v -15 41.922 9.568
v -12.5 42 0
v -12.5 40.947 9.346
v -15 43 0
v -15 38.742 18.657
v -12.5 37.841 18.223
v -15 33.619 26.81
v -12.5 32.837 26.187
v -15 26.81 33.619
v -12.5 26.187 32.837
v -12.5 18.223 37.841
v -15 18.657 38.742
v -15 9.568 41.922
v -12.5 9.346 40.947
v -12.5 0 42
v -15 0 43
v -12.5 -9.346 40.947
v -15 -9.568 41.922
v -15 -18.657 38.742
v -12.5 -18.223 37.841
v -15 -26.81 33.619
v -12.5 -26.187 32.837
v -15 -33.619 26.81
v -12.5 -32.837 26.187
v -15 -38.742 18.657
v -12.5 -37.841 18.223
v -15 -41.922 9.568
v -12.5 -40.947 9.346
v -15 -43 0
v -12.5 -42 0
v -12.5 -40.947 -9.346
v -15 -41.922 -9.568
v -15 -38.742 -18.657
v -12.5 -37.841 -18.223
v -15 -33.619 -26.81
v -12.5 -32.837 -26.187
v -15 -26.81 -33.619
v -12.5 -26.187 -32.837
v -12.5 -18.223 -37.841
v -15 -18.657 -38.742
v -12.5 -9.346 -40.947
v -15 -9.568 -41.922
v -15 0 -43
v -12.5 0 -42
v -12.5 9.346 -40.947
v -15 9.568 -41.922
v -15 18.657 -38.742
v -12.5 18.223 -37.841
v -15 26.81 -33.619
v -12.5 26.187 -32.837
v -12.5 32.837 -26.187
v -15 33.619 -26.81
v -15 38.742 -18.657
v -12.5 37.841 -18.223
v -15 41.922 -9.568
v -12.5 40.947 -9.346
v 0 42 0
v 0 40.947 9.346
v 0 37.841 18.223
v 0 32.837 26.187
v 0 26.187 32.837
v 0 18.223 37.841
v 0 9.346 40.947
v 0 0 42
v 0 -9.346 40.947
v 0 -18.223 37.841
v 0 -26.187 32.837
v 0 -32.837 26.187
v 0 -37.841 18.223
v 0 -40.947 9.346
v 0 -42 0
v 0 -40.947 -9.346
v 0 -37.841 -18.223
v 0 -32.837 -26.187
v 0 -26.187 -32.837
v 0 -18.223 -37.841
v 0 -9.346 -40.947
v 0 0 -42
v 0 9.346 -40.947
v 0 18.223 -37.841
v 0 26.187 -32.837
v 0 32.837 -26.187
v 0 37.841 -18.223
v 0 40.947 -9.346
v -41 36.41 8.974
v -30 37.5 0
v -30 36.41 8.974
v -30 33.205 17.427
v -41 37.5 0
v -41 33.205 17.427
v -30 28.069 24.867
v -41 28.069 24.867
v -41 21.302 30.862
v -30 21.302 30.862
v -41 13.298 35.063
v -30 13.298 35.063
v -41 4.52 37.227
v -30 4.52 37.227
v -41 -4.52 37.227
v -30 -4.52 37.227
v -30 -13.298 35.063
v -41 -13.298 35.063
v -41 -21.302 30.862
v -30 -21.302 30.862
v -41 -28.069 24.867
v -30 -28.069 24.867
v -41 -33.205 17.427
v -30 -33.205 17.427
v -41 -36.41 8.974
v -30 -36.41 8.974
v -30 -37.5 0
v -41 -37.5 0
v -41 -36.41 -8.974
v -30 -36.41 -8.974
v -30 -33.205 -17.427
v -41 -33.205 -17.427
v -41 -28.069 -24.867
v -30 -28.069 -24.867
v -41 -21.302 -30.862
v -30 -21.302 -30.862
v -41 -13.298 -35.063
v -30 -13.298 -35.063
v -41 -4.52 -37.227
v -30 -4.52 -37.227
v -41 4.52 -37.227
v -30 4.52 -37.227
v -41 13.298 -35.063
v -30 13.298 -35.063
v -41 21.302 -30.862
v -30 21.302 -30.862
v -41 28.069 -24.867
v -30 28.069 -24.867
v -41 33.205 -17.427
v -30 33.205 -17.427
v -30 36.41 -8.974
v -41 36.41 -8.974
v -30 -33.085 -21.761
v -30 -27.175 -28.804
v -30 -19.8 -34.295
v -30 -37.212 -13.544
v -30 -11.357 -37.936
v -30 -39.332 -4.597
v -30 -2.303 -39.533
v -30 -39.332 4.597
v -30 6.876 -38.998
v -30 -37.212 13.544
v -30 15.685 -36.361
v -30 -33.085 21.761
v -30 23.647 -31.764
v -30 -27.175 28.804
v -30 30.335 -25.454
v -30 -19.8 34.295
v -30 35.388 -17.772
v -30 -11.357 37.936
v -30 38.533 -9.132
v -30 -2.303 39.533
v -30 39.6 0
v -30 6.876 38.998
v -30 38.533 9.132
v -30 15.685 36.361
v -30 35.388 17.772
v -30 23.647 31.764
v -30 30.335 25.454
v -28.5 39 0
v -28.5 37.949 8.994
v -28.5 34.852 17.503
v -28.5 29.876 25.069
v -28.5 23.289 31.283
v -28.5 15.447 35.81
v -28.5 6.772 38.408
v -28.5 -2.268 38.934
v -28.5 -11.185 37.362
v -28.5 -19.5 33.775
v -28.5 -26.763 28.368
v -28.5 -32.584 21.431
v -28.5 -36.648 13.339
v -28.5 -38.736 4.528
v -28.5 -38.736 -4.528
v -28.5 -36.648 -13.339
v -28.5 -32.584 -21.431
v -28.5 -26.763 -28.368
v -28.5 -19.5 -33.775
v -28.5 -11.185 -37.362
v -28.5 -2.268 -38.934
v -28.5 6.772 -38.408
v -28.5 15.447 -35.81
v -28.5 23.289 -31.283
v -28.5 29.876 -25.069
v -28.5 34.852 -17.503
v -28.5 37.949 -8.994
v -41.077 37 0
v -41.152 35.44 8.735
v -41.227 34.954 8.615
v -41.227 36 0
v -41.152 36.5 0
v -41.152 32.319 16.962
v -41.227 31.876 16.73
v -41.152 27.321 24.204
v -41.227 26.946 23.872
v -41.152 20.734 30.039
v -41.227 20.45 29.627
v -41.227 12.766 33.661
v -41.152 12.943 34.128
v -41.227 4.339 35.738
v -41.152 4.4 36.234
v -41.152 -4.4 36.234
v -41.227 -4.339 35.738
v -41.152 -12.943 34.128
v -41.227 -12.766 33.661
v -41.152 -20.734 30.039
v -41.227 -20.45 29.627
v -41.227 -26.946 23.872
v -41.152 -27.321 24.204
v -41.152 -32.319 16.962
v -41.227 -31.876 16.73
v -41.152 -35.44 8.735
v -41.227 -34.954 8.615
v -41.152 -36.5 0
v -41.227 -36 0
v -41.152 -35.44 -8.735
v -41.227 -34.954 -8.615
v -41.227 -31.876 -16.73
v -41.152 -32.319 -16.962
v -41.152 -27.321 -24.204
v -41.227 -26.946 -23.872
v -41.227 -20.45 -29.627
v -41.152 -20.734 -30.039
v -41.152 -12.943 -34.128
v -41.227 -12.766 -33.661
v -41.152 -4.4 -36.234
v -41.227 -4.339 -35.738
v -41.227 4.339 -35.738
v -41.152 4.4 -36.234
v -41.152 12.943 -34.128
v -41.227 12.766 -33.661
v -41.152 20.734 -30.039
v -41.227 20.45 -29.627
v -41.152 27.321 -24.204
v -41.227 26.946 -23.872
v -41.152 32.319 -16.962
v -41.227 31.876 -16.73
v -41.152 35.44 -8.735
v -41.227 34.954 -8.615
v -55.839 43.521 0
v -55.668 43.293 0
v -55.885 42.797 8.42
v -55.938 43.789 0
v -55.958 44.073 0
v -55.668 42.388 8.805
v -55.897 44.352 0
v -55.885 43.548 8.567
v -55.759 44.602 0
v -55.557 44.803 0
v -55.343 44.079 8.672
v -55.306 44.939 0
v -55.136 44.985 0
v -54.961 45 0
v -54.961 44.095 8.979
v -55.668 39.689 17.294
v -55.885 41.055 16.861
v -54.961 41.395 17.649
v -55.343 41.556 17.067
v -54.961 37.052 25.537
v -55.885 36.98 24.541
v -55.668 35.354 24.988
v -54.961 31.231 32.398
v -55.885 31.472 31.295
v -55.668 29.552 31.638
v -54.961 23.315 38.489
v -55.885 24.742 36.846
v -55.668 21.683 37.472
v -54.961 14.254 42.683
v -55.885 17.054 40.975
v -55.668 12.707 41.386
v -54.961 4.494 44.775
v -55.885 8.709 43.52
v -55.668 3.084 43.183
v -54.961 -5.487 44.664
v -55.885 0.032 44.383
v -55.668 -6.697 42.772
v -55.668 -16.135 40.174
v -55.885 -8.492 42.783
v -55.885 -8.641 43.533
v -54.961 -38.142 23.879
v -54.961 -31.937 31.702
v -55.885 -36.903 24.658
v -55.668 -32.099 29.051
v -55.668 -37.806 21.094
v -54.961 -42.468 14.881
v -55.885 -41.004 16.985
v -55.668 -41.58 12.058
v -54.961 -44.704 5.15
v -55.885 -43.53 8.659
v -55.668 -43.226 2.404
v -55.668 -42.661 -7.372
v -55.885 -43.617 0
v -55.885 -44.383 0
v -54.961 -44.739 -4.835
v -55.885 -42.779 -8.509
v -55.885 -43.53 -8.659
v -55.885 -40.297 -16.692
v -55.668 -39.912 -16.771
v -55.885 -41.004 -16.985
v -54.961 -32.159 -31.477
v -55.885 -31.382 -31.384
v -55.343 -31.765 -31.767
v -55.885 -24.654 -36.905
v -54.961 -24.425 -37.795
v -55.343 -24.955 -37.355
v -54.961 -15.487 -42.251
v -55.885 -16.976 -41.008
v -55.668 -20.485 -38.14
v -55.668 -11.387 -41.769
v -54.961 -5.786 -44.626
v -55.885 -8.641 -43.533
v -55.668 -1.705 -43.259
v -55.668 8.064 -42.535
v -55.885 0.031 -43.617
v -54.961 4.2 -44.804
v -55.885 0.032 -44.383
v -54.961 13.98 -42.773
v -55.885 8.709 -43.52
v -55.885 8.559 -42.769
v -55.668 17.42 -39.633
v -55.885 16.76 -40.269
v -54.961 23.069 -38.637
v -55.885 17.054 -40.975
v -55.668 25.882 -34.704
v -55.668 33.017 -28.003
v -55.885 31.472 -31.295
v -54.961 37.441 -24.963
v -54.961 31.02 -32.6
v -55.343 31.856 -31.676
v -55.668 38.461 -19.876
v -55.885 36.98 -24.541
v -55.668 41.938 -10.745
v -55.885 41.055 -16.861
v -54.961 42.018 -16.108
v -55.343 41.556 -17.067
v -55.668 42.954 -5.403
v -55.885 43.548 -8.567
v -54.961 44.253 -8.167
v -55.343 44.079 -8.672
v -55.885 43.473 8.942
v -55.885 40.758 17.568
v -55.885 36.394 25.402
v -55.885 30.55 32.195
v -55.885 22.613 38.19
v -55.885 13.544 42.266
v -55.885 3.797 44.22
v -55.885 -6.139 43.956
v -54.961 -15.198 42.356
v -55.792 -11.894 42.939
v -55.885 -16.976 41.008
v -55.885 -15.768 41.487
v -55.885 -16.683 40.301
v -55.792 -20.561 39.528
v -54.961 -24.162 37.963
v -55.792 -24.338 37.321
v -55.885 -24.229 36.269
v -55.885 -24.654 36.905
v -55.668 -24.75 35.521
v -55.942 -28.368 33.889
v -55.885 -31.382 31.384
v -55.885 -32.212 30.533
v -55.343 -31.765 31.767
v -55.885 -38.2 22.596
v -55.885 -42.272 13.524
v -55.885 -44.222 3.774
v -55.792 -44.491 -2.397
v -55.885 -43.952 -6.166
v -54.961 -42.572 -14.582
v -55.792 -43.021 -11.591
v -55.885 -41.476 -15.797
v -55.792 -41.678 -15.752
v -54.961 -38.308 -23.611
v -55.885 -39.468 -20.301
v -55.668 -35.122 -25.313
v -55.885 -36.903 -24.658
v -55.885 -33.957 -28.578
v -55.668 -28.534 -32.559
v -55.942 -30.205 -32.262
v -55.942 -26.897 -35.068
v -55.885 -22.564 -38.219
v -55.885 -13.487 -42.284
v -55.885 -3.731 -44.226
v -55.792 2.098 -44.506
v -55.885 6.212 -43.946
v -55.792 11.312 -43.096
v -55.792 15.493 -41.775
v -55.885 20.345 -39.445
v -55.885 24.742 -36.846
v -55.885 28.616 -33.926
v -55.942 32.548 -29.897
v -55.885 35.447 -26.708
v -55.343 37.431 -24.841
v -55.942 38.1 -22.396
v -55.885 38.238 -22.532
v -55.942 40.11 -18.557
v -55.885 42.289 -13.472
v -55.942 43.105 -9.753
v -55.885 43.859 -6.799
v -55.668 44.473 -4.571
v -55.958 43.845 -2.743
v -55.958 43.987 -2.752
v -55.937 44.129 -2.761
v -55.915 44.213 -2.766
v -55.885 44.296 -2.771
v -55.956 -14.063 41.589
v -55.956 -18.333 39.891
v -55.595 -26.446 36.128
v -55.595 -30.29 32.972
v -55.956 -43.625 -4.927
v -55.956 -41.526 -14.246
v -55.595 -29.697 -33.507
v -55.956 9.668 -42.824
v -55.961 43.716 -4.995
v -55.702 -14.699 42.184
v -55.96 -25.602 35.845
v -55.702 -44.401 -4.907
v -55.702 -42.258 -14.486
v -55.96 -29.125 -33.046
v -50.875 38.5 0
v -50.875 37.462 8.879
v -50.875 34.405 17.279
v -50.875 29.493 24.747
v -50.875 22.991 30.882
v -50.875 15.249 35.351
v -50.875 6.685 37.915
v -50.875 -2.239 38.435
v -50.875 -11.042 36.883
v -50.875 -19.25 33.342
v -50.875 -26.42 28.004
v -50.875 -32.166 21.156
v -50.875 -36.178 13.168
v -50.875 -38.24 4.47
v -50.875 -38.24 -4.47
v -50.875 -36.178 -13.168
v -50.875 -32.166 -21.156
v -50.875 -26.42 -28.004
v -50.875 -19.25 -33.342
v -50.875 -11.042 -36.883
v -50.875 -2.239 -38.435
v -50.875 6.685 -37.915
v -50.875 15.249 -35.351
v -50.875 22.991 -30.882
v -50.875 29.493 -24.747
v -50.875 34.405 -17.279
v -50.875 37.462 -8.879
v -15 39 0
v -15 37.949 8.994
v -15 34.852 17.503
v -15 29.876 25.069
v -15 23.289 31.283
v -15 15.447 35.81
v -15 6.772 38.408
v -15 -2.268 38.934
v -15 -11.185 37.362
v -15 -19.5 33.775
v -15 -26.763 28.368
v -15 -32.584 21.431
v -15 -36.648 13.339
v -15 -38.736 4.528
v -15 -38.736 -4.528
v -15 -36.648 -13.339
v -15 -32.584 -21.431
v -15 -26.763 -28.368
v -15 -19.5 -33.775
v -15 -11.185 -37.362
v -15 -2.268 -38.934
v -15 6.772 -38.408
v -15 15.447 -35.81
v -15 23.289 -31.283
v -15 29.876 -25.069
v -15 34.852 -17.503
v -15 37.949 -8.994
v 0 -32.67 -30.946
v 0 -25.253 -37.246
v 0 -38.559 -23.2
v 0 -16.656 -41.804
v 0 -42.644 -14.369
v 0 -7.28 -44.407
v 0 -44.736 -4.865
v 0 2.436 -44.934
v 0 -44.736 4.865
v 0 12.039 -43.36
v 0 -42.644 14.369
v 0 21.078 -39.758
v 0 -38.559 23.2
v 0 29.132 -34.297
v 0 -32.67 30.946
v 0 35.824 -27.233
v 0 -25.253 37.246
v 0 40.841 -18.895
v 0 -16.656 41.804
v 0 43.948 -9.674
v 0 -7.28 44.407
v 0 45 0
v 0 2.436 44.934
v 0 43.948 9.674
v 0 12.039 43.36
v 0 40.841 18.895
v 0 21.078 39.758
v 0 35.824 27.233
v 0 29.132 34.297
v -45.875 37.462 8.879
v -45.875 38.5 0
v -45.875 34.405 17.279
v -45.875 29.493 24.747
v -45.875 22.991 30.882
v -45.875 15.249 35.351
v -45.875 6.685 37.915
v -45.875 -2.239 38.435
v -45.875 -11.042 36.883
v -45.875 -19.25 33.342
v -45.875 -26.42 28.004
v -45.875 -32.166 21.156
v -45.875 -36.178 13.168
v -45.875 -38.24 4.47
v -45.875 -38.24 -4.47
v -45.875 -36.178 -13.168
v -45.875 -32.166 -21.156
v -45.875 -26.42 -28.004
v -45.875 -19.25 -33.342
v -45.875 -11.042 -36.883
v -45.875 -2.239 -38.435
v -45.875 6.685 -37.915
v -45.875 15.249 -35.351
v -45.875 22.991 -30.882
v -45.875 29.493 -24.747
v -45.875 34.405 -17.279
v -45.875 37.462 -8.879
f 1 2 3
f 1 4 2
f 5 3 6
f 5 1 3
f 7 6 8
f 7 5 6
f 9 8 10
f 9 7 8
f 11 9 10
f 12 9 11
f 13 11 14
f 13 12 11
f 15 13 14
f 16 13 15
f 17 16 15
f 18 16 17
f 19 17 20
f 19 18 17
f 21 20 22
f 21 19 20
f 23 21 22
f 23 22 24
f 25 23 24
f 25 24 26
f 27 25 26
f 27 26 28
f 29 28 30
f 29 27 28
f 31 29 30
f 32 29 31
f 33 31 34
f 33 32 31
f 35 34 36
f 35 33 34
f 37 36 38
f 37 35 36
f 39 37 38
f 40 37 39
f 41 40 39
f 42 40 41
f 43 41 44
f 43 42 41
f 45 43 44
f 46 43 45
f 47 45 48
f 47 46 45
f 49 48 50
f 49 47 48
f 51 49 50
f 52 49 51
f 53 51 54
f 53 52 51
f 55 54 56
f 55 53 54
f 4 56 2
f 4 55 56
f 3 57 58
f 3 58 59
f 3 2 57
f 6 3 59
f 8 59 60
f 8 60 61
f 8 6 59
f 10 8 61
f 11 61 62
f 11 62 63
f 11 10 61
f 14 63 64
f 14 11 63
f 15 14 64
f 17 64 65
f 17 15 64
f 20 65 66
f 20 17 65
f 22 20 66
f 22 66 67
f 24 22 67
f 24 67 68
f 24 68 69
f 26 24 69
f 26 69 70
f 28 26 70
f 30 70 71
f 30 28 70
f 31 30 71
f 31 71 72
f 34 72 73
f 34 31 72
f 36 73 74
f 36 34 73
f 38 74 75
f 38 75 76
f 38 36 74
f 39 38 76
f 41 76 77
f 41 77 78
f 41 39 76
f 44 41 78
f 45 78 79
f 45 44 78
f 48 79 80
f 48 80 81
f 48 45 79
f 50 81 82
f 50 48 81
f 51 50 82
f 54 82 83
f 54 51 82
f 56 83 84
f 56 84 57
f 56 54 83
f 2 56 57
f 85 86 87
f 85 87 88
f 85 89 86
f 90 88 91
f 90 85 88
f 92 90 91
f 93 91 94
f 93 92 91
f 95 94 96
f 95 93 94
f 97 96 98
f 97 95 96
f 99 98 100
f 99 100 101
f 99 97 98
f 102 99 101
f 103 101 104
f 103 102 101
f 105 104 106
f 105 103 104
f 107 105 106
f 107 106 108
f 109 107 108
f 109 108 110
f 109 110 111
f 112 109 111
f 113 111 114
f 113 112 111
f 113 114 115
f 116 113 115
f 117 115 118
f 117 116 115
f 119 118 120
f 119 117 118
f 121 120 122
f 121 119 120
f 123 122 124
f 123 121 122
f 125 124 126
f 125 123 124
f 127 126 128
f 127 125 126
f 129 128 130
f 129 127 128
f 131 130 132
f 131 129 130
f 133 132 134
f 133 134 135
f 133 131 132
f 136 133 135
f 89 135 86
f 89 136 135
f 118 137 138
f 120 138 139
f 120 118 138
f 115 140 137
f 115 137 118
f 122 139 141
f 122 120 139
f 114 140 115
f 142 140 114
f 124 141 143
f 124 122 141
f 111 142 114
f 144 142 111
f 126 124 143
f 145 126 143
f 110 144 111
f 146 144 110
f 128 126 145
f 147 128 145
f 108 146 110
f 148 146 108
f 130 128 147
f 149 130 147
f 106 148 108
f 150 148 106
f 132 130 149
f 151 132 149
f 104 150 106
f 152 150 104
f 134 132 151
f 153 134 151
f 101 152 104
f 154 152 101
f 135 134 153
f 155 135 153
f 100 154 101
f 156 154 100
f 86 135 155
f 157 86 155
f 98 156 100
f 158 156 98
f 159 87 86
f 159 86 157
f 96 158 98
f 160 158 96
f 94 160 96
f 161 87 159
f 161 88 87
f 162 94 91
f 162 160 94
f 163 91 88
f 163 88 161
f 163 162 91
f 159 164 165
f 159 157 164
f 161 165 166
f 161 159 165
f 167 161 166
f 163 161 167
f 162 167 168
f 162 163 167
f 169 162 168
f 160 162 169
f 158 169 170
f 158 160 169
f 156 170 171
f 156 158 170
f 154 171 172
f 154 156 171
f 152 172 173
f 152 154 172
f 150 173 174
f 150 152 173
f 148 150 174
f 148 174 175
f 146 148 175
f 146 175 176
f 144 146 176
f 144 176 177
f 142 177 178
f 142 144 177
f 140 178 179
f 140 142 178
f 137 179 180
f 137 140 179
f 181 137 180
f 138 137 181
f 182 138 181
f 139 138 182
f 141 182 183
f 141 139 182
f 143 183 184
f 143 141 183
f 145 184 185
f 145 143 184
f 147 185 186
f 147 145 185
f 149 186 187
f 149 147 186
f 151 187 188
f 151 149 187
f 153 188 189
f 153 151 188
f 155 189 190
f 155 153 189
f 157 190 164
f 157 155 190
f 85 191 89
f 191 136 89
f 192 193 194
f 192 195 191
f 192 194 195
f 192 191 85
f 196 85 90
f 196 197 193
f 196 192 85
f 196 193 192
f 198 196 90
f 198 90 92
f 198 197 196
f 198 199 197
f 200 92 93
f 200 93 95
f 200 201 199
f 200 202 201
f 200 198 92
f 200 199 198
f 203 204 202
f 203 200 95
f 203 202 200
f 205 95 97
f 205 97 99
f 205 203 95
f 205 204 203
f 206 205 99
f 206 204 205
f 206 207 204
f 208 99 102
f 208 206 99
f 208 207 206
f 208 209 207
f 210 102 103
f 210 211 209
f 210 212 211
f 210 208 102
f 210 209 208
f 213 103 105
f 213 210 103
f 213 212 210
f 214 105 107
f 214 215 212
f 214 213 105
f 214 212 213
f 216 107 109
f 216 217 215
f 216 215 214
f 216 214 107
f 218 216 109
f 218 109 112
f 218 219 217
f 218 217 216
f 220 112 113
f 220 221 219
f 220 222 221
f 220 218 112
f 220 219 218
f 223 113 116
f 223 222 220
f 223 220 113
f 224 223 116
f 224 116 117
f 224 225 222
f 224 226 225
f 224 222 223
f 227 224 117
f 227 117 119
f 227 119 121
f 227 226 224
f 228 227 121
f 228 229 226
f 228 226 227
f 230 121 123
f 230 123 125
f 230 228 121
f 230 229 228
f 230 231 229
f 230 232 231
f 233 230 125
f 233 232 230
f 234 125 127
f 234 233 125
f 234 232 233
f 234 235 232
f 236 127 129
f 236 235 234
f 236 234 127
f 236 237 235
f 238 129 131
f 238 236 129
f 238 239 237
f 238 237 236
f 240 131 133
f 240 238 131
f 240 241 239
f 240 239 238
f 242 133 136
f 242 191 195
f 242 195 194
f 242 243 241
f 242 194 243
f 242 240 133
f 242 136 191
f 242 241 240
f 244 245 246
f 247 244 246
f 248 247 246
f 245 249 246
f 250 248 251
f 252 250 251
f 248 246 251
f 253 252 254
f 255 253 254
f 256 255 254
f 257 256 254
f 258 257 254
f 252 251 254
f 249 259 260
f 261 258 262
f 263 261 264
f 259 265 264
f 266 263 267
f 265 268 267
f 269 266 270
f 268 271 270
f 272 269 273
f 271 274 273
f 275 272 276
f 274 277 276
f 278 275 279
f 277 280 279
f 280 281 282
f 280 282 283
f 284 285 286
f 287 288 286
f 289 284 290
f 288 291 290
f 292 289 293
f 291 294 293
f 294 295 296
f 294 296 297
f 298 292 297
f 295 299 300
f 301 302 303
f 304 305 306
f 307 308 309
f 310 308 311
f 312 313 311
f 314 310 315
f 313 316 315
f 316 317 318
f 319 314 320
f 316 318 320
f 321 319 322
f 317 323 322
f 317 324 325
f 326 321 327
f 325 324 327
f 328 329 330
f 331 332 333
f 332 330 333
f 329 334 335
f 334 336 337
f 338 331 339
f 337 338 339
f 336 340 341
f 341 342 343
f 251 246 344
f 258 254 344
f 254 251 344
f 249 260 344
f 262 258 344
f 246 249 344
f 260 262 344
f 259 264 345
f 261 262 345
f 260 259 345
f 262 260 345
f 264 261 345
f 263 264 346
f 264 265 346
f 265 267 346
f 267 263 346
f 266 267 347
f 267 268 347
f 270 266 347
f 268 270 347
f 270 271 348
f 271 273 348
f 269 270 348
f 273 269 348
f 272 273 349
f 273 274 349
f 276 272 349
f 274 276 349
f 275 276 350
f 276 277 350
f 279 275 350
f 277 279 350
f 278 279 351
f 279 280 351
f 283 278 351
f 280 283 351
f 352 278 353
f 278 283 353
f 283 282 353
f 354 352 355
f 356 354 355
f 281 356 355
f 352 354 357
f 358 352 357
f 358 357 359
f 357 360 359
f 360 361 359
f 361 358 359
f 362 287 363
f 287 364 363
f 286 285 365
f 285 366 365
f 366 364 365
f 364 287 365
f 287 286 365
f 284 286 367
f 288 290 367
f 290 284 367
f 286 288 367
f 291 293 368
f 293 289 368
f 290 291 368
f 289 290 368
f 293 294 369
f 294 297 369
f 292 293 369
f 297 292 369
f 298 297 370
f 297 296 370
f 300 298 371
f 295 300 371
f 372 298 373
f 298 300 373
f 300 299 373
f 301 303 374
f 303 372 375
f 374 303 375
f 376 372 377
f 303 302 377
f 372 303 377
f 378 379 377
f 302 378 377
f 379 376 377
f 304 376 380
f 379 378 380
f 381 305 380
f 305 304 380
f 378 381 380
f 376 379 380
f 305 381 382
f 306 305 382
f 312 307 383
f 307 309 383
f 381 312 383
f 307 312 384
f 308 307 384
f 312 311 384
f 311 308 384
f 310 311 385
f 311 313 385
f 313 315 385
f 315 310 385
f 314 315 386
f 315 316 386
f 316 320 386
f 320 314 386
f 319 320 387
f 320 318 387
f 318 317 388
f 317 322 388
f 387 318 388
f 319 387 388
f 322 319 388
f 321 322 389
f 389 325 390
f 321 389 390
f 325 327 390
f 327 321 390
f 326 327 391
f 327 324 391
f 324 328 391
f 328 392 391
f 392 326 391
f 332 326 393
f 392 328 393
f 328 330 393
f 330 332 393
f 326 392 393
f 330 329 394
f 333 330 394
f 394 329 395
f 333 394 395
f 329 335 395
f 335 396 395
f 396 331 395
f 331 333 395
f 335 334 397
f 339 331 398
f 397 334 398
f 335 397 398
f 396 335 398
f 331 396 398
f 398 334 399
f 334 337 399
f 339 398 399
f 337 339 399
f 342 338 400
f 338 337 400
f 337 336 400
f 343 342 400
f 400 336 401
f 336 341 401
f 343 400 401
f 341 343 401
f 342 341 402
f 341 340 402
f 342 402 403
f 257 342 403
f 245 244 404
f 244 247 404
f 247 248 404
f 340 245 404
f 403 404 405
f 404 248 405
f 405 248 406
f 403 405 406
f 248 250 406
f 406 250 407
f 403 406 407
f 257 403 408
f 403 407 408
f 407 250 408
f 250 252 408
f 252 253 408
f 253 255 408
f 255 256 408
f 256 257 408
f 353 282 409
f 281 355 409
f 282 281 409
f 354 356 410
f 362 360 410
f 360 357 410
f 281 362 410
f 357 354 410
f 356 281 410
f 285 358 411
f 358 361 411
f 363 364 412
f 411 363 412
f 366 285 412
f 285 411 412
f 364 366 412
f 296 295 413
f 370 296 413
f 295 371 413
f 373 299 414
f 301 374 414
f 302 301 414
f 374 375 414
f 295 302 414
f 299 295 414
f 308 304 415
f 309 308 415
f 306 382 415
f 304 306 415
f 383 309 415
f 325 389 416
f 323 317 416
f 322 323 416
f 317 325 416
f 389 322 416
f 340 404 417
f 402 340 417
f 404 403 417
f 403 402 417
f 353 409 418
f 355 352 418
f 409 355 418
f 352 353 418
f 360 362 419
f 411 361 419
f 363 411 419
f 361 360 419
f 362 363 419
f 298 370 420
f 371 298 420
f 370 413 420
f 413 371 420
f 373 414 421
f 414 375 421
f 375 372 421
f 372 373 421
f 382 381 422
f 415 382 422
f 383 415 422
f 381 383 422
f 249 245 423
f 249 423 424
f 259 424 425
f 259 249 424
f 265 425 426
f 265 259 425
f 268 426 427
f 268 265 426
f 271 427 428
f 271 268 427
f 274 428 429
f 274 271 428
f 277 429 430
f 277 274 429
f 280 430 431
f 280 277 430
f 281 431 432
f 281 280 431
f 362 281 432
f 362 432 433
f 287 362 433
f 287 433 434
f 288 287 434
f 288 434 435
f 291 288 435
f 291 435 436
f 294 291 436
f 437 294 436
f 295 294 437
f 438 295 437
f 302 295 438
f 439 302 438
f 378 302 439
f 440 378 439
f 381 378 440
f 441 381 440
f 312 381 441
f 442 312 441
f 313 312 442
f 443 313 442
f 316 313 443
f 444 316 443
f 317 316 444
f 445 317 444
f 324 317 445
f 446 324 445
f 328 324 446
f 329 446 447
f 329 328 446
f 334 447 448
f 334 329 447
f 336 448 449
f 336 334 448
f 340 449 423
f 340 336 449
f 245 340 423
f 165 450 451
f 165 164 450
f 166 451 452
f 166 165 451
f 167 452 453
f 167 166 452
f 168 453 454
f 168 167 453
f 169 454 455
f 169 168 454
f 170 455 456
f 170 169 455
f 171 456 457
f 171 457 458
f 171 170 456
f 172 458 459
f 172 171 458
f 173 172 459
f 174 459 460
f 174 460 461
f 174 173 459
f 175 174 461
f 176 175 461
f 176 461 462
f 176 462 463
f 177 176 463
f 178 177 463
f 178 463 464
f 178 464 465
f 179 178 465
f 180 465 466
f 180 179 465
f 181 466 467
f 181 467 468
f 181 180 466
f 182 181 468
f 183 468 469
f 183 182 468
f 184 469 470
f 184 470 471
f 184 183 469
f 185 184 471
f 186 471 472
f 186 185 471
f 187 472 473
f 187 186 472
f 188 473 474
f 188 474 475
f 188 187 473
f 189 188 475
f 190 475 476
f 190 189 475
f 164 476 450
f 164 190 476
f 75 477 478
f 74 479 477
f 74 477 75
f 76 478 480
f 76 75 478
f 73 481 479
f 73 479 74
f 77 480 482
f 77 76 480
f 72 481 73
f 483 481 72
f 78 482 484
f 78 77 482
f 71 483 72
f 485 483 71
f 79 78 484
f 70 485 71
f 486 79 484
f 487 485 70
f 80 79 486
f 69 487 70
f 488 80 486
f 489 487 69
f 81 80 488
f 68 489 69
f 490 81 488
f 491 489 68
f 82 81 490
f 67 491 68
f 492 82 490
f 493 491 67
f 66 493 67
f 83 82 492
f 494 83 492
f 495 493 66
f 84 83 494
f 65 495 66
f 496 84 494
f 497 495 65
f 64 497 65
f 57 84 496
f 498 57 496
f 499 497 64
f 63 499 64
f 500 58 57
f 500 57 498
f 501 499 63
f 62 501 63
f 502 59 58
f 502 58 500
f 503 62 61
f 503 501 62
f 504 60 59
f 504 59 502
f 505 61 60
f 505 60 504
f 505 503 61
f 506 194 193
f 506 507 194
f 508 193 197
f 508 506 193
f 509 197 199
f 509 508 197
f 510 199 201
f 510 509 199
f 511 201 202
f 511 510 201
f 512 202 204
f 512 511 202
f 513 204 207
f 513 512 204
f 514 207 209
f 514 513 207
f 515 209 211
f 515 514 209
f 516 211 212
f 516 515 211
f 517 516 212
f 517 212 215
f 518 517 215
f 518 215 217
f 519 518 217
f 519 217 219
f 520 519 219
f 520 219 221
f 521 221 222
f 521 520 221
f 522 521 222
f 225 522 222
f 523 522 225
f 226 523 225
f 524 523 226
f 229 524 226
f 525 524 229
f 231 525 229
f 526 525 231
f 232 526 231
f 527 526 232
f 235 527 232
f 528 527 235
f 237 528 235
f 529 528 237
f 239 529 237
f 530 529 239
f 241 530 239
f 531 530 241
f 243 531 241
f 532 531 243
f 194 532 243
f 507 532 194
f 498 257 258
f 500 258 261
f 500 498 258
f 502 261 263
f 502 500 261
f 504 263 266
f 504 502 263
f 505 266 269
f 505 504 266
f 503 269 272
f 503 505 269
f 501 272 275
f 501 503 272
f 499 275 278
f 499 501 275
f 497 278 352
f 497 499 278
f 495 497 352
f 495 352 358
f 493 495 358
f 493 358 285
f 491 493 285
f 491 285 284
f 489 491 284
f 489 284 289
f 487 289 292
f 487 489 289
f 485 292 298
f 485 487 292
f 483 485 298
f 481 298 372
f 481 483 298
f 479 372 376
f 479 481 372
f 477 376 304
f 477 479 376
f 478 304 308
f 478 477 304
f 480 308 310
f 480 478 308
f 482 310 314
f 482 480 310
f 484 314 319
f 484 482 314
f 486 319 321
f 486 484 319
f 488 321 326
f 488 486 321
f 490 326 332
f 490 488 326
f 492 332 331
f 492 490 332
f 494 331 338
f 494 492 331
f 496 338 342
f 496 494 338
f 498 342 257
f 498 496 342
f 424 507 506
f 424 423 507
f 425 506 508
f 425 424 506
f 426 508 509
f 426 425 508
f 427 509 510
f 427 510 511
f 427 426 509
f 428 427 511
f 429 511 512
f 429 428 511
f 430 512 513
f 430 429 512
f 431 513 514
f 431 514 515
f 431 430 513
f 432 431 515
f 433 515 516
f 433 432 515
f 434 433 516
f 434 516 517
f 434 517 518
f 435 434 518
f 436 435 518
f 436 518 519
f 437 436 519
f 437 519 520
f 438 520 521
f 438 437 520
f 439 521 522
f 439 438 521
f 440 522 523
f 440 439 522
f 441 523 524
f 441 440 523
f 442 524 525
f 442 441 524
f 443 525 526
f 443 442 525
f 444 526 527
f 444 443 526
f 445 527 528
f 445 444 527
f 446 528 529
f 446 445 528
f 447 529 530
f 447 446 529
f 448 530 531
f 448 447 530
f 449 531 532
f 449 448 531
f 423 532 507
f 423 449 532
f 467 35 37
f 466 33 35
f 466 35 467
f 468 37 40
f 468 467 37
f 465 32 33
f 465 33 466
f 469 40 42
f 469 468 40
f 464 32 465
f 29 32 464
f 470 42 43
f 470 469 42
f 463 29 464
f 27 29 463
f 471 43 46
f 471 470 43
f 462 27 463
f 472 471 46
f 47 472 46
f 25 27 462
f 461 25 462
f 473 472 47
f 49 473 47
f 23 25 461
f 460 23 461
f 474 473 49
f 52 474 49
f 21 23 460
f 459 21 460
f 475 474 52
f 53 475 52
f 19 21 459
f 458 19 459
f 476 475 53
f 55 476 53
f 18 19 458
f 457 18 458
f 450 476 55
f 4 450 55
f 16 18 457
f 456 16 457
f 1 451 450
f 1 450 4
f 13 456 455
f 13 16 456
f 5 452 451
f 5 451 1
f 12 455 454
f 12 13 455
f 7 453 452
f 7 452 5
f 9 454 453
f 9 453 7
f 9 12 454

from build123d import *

# Parameters (mm, degrees)
ZAOBLIT1_R = 1


with BuildPart() as part:
    # Skica1 → Rotovat1 (revolve)
    with BuildSketch(Plane.XY):
        with BuildLine():
            Line((-41.226629622, 36), (-45.875032134, 38.5))
            Line((-45.875032134, 38.5), (-50.875032134, 38.5))
            Line((-50.875032134, 38.5), (-57.375032134, 45))
            Line((-57.375032134, 45), (0, 45))
            Line((0, 45), (0, 42))
            Line((0, 42), (-12.5, 42))
            Line((-12.5, 42), (-15, 43))
            Line((-15, 43), (-15, 39))
            Line((-15, 39), (-28.5, 39))
            Line((-28.5, 39), (-30, 39.6))
            Line((-30, 39.6), (-30, 37.5))
            Line((-30, 37.5), (-41, 37.5))
            ThreePointArc((-41, 37.5), (-41.114471082, 36.750174697), (-41.226629622, 36))
        make_face()
    revolve(axis=Axis((0, 0, 0), (1, 0, 0)))

    # Zaoblit1
    zaoblit1_edges = [part.edges().sort_by_distance(p)[0] for p in [
        (-57.375032134, -45, 0),
    ]]
    fillet(zaoblit1_edges, radius=ZAOBLIT1_R)


solid = part.part
